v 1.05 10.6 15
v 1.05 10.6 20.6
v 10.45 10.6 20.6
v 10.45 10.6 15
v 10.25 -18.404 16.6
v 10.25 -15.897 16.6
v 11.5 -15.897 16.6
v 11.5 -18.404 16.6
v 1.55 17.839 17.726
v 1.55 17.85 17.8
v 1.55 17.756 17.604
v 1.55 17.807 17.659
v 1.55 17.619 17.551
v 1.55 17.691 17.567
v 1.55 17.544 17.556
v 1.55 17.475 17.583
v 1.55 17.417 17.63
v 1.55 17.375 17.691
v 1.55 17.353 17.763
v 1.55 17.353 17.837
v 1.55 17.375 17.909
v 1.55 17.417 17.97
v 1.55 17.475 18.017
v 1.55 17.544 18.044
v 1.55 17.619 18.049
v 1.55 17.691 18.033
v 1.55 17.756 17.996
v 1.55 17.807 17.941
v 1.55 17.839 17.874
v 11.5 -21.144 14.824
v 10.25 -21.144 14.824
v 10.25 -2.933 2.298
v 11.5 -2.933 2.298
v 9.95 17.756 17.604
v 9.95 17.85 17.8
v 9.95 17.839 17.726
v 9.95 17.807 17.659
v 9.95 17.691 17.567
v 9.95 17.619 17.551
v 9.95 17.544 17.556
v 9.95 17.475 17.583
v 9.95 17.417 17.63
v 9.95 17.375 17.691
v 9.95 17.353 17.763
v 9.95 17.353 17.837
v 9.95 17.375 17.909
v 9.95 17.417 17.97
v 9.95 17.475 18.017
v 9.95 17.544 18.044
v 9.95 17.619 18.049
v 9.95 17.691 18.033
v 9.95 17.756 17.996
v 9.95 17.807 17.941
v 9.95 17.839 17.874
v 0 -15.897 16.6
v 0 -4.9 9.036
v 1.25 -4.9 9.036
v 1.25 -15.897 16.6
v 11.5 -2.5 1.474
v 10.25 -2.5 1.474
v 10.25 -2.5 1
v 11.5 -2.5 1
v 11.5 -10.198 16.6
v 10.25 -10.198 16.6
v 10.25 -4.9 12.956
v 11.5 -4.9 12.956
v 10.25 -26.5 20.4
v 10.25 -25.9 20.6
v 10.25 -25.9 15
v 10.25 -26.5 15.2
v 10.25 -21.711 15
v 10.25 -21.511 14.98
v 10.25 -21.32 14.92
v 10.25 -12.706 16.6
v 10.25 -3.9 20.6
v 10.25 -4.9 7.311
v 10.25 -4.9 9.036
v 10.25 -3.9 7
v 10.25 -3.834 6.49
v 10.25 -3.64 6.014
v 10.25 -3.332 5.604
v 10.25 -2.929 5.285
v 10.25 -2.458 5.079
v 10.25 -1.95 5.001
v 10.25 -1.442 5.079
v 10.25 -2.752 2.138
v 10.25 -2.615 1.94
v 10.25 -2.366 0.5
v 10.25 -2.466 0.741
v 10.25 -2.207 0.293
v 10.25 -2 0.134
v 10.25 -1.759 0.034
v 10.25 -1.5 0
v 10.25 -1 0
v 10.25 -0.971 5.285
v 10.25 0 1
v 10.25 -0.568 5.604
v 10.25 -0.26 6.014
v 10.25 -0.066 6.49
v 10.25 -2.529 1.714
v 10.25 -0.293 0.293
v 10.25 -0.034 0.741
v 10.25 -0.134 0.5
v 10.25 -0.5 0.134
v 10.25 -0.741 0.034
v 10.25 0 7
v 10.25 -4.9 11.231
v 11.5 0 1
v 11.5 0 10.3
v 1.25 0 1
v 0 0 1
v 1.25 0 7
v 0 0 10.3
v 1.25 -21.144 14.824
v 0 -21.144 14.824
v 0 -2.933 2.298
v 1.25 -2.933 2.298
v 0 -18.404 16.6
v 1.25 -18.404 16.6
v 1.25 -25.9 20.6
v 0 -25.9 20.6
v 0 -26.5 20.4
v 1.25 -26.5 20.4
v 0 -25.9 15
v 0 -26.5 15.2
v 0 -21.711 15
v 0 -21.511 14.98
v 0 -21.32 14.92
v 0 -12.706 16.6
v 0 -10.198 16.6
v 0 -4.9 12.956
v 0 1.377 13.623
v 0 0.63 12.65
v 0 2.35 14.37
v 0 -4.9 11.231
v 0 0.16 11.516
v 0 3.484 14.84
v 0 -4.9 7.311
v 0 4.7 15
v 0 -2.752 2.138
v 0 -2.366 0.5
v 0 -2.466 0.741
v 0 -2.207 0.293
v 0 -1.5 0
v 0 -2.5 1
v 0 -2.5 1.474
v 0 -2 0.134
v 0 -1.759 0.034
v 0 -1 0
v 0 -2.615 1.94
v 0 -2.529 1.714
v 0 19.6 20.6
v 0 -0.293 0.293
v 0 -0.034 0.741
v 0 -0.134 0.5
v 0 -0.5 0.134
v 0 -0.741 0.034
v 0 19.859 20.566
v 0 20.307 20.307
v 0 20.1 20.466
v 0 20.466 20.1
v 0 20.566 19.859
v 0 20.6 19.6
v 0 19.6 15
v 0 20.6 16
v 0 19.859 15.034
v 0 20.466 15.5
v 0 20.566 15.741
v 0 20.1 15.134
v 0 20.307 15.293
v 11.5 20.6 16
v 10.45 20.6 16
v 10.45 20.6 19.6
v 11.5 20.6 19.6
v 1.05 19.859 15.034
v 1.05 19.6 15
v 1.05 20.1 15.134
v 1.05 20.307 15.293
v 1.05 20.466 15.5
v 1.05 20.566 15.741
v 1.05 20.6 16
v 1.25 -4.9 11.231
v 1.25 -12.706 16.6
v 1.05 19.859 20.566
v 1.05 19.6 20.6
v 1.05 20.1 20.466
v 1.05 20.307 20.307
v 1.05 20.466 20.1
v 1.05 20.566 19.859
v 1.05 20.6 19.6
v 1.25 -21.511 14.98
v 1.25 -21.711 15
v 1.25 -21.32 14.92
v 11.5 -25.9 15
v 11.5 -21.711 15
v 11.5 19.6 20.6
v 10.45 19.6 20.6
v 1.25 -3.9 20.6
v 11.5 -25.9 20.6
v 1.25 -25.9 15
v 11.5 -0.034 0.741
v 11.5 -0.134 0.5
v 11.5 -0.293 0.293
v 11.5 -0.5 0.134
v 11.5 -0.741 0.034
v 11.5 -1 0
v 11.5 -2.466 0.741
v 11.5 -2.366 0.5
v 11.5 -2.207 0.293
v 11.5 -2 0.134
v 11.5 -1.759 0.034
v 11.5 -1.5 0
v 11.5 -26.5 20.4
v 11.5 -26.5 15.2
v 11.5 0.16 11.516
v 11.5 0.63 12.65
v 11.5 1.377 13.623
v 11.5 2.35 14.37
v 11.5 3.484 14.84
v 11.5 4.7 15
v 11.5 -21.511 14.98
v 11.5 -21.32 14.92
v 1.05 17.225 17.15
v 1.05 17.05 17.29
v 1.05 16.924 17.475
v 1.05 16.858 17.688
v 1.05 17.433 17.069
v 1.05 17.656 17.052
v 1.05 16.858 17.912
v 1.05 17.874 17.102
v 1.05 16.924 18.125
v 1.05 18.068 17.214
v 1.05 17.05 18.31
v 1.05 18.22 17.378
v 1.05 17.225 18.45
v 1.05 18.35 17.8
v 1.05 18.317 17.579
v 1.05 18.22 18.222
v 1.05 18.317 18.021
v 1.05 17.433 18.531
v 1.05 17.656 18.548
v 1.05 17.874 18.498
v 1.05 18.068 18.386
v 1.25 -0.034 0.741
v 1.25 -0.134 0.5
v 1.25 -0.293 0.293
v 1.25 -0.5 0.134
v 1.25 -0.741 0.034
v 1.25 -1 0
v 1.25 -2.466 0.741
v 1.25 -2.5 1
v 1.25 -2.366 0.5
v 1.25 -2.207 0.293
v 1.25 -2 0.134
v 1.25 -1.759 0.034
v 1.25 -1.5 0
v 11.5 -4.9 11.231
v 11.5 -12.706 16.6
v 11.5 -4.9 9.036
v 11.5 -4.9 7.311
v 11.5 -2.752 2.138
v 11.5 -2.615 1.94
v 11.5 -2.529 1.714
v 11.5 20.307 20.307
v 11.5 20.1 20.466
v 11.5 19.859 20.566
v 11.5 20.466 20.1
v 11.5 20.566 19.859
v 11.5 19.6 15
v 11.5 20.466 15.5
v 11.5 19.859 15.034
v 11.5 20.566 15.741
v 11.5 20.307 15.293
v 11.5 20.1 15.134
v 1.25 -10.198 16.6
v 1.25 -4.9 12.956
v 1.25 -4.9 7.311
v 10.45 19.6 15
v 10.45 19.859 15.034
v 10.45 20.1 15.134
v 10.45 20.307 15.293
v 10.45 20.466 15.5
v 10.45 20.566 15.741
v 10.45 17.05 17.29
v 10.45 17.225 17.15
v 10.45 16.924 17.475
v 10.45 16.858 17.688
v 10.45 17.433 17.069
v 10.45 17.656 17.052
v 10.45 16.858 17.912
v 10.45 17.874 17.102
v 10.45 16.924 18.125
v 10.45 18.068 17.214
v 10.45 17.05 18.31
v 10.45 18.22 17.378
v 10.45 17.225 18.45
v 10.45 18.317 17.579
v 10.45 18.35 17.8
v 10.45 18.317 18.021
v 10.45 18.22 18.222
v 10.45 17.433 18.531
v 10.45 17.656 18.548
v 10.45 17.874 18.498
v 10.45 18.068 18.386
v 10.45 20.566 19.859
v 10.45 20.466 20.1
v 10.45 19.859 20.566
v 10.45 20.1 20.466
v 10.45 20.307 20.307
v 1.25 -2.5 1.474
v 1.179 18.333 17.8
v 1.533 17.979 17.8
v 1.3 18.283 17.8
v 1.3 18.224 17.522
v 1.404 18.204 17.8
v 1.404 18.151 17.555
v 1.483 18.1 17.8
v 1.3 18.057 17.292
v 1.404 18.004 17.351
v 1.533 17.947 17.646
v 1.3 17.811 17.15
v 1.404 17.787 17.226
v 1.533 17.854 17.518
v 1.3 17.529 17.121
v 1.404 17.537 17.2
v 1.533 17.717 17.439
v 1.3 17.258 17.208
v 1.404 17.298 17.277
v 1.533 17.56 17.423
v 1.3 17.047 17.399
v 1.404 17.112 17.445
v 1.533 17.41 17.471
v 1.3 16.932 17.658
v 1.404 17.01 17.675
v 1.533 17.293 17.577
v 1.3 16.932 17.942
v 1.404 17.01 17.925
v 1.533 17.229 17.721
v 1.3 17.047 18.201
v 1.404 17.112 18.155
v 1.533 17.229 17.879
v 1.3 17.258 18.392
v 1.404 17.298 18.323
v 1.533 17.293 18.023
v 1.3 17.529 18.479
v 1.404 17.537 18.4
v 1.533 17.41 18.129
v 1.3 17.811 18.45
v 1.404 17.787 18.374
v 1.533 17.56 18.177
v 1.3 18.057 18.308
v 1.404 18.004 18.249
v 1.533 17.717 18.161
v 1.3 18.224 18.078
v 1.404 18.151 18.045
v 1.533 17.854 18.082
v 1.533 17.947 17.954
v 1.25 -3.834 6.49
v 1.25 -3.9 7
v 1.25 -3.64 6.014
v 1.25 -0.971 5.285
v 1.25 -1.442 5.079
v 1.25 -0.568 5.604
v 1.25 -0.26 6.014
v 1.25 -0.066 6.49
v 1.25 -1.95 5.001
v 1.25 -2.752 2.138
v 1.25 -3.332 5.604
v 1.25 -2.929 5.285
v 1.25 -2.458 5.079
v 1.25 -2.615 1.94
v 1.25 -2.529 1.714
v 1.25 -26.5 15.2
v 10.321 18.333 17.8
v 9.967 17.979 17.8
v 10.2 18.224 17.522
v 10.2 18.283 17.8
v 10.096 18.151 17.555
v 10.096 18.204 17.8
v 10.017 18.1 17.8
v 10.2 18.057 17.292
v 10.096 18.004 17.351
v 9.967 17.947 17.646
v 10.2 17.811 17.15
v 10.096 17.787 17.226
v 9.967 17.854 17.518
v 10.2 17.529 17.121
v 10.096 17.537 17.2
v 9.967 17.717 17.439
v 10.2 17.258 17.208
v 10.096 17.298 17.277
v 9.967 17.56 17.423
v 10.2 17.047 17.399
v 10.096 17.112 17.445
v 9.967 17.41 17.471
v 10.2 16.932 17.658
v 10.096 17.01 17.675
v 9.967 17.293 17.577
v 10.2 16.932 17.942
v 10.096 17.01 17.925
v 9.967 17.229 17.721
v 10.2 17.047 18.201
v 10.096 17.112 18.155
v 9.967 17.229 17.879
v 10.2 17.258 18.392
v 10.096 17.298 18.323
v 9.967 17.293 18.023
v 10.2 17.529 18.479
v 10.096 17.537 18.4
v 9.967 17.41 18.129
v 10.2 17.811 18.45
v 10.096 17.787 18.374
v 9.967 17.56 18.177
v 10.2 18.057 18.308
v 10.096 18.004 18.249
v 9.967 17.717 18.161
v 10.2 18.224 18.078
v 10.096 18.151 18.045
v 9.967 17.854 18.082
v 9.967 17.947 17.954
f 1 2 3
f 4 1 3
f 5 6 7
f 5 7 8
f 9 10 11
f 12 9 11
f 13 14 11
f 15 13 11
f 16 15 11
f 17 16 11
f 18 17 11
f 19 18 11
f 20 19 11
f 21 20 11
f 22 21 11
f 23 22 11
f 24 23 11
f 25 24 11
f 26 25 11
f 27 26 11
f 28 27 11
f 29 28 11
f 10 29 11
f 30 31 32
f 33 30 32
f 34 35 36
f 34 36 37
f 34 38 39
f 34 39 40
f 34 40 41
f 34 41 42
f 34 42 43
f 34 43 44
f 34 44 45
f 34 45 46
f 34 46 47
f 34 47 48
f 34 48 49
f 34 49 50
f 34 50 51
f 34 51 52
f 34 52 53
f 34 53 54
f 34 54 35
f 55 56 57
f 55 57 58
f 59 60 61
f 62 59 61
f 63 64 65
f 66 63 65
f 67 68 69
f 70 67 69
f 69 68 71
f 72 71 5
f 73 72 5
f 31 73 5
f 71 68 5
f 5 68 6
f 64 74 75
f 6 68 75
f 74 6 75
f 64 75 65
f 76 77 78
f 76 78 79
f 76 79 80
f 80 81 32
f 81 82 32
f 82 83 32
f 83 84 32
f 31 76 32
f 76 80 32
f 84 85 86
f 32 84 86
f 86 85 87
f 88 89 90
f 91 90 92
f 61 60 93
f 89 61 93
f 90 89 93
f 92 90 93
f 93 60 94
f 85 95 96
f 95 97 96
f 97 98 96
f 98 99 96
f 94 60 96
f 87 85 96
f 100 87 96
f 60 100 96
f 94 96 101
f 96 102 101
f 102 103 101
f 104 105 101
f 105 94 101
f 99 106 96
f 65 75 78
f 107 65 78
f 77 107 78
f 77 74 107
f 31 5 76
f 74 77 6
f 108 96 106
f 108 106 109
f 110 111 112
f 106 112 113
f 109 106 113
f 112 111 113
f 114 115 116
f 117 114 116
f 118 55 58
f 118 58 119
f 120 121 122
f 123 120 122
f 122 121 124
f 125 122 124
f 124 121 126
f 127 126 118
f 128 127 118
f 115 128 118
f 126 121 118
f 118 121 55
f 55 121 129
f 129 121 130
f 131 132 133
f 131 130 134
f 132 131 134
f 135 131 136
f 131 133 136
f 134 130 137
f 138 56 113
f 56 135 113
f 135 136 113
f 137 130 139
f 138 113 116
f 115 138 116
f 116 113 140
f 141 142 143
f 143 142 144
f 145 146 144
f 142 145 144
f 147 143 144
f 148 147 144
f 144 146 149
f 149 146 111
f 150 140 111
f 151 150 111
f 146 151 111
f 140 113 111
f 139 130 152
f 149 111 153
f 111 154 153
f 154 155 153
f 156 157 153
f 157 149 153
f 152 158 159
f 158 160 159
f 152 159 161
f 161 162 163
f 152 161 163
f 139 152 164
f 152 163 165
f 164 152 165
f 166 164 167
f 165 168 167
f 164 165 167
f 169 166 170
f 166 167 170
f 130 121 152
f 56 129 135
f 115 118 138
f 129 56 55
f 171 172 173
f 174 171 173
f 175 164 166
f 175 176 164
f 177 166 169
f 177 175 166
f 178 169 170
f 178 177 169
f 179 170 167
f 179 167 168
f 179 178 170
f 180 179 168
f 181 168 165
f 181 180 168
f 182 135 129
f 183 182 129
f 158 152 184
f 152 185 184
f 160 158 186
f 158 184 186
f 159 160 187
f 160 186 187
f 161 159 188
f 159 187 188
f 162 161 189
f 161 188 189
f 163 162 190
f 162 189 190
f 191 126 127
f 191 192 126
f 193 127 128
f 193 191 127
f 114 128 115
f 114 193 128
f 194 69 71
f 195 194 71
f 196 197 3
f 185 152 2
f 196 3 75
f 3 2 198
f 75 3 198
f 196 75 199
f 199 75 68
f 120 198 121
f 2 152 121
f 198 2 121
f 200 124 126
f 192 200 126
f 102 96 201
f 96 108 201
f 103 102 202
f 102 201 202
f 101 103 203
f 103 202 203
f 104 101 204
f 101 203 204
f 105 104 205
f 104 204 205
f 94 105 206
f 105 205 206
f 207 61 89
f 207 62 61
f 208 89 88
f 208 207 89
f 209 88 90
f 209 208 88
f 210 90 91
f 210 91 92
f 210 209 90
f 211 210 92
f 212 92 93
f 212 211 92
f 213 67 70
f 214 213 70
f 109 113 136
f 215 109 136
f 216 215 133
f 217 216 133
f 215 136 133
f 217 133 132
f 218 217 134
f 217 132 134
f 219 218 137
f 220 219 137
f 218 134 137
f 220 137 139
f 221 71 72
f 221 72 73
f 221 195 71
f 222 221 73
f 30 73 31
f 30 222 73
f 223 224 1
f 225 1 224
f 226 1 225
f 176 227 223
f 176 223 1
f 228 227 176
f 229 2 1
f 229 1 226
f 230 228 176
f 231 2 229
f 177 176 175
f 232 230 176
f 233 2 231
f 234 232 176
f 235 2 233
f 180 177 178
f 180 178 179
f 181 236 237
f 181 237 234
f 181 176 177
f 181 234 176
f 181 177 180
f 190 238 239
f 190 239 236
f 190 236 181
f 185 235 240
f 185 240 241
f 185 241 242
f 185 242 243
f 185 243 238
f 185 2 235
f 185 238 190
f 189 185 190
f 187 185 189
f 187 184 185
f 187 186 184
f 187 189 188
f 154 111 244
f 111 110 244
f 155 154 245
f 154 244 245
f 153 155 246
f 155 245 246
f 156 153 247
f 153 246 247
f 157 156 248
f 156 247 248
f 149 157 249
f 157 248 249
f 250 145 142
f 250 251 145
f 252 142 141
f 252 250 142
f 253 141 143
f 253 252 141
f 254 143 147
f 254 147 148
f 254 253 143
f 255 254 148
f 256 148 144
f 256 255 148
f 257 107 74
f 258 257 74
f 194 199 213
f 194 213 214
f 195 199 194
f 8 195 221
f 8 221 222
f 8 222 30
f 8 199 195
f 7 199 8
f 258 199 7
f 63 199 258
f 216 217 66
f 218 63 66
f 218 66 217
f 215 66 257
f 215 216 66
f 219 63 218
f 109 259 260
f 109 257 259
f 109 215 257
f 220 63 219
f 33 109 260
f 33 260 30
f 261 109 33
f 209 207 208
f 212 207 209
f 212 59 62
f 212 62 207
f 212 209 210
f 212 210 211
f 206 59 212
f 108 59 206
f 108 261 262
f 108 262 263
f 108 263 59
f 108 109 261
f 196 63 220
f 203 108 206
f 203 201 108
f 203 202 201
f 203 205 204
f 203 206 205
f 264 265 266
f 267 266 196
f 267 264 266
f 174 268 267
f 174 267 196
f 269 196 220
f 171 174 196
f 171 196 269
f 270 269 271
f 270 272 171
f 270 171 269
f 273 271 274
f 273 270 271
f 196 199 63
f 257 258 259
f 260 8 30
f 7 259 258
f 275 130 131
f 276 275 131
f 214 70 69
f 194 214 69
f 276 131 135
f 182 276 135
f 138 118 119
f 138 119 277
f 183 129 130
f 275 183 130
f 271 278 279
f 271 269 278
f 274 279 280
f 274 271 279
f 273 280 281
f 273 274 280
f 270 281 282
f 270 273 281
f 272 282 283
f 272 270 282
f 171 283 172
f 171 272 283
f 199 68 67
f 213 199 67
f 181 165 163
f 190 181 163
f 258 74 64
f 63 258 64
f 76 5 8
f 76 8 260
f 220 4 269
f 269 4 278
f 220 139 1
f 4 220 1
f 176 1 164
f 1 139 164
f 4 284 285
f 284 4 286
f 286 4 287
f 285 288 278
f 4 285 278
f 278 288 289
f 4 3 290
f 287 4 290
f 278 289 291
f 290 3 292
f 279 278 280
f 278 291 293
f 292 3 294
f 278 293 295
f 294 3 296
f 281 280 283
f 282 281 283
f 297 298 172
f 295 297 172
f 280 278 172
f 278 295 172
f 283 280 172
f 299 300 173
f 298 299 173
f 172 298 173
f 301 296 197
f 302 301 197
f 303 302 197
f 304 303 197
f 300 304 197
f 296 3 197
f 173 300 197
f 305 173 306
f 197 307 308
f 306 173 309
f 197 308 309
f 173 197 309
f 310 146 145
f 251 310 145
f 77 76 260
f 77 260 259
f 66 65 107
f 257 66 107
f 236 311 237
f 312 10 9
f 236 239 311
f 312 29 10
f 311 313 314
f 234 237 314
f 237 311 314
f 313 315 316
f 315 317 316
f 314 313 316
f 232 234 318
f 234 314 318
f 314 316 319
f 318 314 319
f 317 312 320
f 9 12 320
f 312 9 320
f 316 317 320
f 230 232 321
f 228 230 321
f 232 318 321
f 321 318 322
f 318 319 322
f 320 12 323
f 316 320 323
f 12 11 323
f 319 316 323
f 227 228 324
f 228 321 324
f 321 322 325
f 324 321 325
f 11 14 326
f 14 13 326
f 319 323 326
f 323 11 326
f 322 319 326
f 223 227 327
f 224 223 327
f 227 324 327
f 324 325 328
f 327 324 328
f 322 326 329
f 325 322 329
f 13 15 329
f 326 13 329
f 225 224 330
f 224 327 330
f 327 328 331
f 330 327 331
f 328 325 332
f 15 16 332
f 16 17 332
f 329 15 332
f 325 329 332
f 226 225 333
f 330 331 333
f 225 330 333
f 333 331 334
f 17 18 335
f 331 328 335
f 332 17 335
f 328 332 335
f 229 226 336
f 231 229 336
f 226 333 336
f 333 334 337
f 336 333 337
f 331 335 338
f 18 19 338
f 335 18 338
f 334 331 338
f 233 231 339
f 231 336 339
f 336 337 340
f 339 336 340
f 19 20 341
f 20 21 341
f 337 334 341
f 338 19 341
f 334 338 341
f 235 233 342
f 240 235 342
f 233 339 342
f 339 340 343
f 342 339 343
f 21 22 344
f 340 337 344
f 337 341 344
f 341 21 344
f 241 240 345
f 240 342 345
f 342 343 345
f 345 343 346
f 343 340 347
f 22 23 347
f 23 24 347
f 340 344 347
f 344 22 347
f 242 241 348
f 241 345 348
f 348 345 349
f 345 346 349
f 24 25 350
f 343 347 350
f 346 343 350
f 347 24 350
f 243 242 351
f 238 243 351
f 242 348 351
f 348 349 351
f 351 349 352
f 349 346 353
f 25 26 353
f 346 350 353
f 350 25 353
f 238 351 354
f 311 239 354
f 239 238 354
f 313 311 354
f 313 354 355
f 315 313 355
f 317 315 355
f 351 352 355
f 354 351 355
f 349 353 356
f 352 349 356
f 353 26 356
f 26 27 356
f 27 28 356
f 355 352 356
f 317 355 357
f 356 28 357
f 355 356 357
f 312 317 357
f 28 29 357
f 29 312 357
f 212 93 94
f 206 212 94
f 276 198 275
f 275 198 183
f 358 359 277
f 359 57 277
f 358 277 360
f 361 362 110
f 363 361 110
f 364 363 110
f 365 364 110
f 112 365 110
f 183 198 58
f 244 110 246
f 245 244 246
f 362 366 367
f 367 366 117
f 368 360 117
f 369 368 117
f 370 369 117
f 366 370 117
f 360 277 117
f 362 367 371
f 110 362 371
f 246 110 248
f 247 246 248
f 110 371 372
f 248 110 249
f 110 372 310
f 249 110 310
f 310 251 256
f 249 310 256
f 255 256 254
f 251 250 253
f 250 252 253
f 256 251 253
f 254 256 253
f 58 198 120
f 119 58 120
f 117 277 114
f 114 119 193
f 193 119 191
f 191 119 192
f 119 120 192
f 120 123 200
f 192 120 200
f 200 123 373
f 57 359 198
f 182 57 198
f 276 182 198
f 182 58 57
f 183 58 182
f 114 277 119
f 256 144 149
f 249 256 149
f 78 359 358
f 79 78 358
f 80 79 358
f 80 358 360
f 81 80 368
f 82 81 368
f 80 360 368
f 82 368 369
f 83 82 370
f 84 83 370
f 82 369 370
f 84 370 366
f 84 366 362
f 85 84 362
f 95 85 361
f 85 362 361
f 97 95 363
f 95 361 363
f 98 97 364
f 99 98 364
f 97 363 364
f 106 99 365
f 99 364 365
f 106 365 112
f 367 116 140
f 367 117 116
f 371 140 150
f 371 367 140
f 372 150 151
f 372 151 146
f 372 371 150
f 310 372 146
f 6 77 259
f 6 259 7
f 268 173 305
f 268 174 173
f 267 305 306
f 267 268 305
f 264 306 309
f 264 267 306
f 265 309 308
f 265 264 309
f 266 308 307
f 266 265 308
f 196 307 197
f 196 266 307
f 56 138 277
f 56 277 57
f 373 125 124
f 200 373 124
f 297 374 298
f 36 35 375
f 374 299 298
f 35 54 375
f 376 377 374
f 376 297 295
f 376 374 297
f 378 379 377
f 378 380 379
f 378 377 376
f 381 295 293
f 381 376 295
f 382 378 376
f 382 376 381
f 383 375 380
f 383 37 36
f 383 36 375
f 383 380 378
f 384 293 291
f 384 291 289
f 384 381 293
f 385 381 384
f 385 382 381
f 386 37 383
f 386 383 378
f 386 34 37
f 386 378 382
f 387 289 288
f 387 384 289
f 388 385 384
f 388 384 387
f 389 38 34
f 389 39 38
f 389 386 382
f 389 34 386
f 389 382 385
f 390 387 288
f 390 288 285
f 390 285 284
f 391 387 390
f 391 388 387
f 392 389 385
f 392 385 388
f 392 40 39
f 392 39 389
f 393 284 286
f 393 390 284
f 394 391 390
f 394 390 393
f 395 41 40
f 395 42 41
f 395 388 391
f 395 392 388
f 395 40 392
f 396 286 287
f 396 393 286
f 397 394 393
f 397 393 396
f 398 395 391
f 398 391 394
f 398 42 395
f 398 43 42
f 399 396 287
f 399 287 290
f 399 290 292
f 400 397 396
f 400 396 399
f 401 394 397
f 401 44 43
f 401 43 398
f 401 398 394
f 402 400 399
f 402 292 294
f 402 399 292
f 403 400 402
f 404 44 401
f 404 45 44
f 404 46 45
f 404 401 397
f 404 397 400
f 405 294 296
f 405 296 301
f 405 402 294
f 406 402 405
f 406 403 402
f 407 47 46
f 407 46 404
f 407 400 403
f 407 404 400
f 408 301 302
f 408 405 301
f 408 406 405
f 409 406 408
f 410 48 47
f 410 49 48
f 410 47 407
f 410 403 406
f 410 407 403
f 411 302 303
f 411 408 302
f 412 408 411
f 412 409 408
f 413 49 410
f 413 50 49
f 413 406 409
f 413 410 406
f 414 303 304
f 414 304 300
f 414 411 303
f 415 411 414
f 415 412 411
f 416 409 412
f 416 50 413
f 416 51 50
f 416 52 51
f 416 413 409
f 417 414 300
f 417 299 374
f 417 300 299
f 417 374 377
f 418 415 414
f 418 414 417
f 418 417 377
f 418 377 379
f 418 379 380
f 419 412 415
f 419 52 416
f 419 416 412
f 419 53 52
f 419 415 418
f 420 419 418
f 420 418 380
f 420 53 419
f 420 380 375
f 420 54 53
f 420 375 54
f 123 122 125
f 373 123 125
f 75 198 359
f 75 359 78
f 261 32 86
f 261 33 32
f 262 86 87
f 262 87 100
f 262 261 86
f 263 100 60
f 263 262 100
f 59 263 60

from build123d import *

# Parameters (mm, degrees)
DODANIE_WYCI_GNI_CIE1_DEPTH     = 11.5
SZKIC2_W                        = 9.4
SZKIC2_H                        = 10
SZKIC2_W_2                      = 9
SZKIC2_H_2                      = 24.370303929
WYTNIJ_WYCI_GNI_CIE1_DEPTH      = 36.480417134
WYTNIJ_WYCI_GNI_CIE2_DEPTH      = 36.480417134
WYTNIJ_WYCI_GNI_CIE2_DEPTH_BACK = 36.480417134
SZKIC4_W                        = 9
SZKIC4_H                        = 5
WYTNIJ_WYCI_GNI_CIE3_DEPTH      = 10
ZAOKR_GLENIE1_R                 = 2
ZAOKR_GLENIE2_R                 = 1
SZKIC5_R                        = 0.75
DODANIE_WYCI_GNI_CIE2_DEPTH     = 0.5
ZAOKR_GLENIE3_R                 = 0.5


# Some blends are built 0.0001 mm under size
with BuildPart() as part:
    # Szkic1 → Dodanie-wyciągnięcie1 (new body)
    with BuildSketch(Plane(origin=(0, 0, 0), x_dir=(0, 0, -1), z_dir=(1, 0, 0))):
        with BuildLine():
            Line((0, 0), (-10.3, 0))
            ThreePointArc((-10.3, 0), (-13.623401872, 1.376598128), (-15, 4.7))
            Line((-15, 4.7), (-15, 20.6))
            Line((-15, 20.6), (-20.6, 20.6))
            Line((-20.6, 20.6), (-20.6, -21.4))
            Line((-20.6, -21.4), (-20.6, -25.9))
            Line((-20.6, -25.9), (-20.4, -26.5))
            Line((-20.4, -26.5), (-15.2, -26.5))
            Line((-15.2, -26.5), (-15, -25.9))
            Line((-15, -25.9), (-15, -21.4))
            Line((-15, -21.4), (-2, -2.5))
            Line((-2, -2.5), (0, -2.5))
            Line((0, -2.5), (0, 0))
        make_face()
    extrude(amount=DODANIE_WYCI_GNI_CIE1_DEPTH)

    # Szkic2 → Wytnij-wyciągnięcie1 (cut, through all)
    with BuildSketch(Plane.XY.offset(20.6)):
        with Locations((5.75, 15.6)):
            Rectangle(SZKIC2_W, SZKIC2_H)
        with Locations((5.75, -16.085151964)):
            Rectangle(SZKIC2_W_2, SZKIC2_H_2)
    extrude(amount=-WYTNIJ_WYCI_GNI_CIE1_DEPTH, mode=Mode.SUBTRACT)

    # Szkic3 → Wytnij-wyciągnięcie2 (cut, two sides: drawn at the far end of the back side and taken through both)
    with BuildSketch(Plane(origin=(11.5, 0, 0), x_dir=(0, 0, -1), z_dir=(1, 0, 0)).offset(-WYTNIJ_WYCI_GNI_CIE2_DEPTH_BACK)):
        Polygon((-16.6, -12.705585851), (-16.6, -10.198492794), (-12.955534057, -4.9), (-11.231078515, -4.9), align=None)
        Polygon((-16.6, -15.897210923), (-16.6, -18.40430398), (-7.311325305, -4.9), (-9.035780847, -4.9), align=None)
    extrude(amount=WYTNIJ_WYCI_GNI_CIE2_DEPTH + WYTNIJ_WYCI_GNI_CIE2_DEPTH_BACK, mode=Mode.SUBTRACT)

    # Szkic4 → Wytnij-wyciągnięcie3 (cut)
    with BuildSketch(Plane(origin=(0, 0, 0), x_dir=(1, 0, 0), z_dir=(0, 1, 0))):
        with Locations((5.75, -2.5)):
            Rectangle(SZKIC4_W, SZKIC4_H)
    extrude(amount=-WYTNIJ_WYCI_GNI_CIE3_DEPTH, mode=Mode.SUBTRACT)

    # Zaokrąglenie1
    # the kernel refuses this fillet: 2 mm, written as the material it takes off along each edge
    with BuildSketch(Plane(origin=(1.25, -3.9, 5), x_dir=(0, 0, 1), z_dir=(1, 0, 0))) as zaokr_glenie1_piece_1:
        with BuildLine():
            CenterArc((ZAOKR_GLENIE1_R, -ZAOKR_GLENIE1_R), ZAOKR_GLENIE1_R, 90, 90)
            Line((0, -ZAOKR_GLENIE1_R), (0, 0))
            Line((0, 0), (ZAOKR_GLENIE1_R, 0))
        make_face()
    extrude(amount=9, mode=Mode.SUBTRACT)
    with BuildSketch(Plane(origin=(1.25, 0, 5), x_dir=(0, 0, 1), z_dir=(1, 0, 0))) as zaokr_glenie1_piece_2:
        with BuildLine():
            CenterArc((ZAOKR_GLENIE1_R, ZAOKR_GLENIE1_R), ZAOKR_GLENIE1_R, 180, 90)
            Line((0, ZAOKR_GLENIE1_R), (0, 0))
            Line((0, 0), (ZAOKR_GLENIE1_R, 0))
        make_face()
    extrude(amount=9, mode=Mode.SUBTRACT)

    # Zaokrąglenie2
    zaokr_glenie2_edges = [part.edges().sort_by_distance(p)[0] for p in [
        (0.625, 0, 0),
        (0.625, -2.5, 0),
        (0.625, -2.5, 2),
        (10.975, 20.6, 20.6),
        (10.975, 20.6, 15),
        (10.875, 0, 0),
        (10.875, -2.5, 0),
        (10.875, -2.5, 2),
        (10.875, -21.4, 15),
        (0.525, 20.6, 20.6),
        (0.525, 20.6, 15),
        (0.625, -21.4, 15),
    ]]
    fillet(zaokr_glenie2_edges, radius=ZAOKR_GLENIE2_R)

    # Szkic5 → Dodanie-wyciągnięcie2 (add)
    with BuildSketch(Plane.ZY.offset(-10.45)):
        with Locations(Location((17.8, 17.6, 0), (0, 0, 90))):
            Circle(SZKIC5_R)
    extrude(amount=DODANIE_WYCI_GNI_CIE2_DEPTH)

    # Zaokrąglenie3
    zaokr_glenie3_edges = [part.edges().sort_by_distance(p)[0] for p in [
        (9.95, 16.85, 17.8),
    ]]
    fillet(zaokr_glenie3_edges, radius=ZAOKR_GLENIE3_R - 0.0001)  # a hair under: the kernel refuses the full size

    # Lustro2: part across plane


with BuildPart() as part_1:
    add(part.part)
    add(part.part.mirror(Plane(origin=(5.75, 0, 0), x_dir=(0, 0, 1), z_dir=(1, 0, 0))))


solid = part_1.part
